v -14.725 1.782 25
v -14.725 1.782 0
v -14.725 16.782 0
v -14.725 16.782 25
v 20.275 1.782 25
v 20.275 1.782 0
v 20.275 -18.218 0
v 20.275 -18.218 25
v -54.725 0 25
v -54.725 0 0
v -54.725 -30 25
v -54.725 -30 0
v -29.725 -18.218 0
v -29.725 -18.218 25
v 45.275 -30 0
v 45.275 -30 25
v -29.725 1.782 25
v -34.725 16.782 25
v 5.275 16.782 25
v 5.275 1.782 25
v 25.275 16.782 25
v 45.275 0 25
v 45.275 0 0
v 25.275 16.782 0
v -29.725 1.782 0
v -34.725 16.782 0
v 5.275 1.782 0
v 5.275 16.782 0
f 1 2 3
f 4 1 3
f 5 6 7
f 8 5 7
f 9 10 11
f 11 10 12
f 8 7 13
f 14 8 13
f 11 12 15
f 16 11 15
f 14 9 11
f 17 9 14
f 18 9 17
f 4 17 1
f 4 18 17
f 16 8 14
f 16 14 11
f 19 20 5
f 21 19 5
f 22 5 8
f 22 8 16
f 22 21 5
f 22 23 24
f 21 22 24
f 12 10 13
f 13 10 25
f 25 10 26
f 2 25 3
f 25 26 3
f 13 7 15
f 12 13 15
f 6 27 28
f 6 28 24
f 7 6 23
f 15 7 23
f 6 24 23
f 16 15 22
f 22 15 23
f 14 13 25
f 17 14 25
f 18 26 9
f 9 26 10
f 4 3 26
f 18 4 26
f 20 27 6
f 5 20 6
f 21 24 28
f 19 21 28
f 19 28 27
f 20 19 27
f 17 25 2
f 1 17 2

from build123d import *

# Parameters (mm, degrees)
F1_DEPTH = 25


with BuildPart() as f1:
    # F0 (on Top) → F1 (new body)
    with BuildSketch(Plane.XY):
        Polygon((-54.724703, 0), (-54.724703, -30), (45.275297, -30), (45.275297, 0), (20.275297, 0), (20.275297, -18.218007), (-29.724703, -18.218007), (-29.724703, 0), align=None)
        Polygon((-34.724703, 16.781993), (-54.724703, 0), (-29.724703, 0), (-29.724703, 1.781993), (-14.724703, 1.781993), (-14.724703, 16.781993), align=None)
        Polygon((20.275297, 0), (45.275297, 0), (25.275297, 16.781993), (5.275297, 16.781993), (5.275297, 1.781993), (20.275297, 1.781993), align=None)
    extrude(amount=F1_DEPTH)


solid = f1.part
